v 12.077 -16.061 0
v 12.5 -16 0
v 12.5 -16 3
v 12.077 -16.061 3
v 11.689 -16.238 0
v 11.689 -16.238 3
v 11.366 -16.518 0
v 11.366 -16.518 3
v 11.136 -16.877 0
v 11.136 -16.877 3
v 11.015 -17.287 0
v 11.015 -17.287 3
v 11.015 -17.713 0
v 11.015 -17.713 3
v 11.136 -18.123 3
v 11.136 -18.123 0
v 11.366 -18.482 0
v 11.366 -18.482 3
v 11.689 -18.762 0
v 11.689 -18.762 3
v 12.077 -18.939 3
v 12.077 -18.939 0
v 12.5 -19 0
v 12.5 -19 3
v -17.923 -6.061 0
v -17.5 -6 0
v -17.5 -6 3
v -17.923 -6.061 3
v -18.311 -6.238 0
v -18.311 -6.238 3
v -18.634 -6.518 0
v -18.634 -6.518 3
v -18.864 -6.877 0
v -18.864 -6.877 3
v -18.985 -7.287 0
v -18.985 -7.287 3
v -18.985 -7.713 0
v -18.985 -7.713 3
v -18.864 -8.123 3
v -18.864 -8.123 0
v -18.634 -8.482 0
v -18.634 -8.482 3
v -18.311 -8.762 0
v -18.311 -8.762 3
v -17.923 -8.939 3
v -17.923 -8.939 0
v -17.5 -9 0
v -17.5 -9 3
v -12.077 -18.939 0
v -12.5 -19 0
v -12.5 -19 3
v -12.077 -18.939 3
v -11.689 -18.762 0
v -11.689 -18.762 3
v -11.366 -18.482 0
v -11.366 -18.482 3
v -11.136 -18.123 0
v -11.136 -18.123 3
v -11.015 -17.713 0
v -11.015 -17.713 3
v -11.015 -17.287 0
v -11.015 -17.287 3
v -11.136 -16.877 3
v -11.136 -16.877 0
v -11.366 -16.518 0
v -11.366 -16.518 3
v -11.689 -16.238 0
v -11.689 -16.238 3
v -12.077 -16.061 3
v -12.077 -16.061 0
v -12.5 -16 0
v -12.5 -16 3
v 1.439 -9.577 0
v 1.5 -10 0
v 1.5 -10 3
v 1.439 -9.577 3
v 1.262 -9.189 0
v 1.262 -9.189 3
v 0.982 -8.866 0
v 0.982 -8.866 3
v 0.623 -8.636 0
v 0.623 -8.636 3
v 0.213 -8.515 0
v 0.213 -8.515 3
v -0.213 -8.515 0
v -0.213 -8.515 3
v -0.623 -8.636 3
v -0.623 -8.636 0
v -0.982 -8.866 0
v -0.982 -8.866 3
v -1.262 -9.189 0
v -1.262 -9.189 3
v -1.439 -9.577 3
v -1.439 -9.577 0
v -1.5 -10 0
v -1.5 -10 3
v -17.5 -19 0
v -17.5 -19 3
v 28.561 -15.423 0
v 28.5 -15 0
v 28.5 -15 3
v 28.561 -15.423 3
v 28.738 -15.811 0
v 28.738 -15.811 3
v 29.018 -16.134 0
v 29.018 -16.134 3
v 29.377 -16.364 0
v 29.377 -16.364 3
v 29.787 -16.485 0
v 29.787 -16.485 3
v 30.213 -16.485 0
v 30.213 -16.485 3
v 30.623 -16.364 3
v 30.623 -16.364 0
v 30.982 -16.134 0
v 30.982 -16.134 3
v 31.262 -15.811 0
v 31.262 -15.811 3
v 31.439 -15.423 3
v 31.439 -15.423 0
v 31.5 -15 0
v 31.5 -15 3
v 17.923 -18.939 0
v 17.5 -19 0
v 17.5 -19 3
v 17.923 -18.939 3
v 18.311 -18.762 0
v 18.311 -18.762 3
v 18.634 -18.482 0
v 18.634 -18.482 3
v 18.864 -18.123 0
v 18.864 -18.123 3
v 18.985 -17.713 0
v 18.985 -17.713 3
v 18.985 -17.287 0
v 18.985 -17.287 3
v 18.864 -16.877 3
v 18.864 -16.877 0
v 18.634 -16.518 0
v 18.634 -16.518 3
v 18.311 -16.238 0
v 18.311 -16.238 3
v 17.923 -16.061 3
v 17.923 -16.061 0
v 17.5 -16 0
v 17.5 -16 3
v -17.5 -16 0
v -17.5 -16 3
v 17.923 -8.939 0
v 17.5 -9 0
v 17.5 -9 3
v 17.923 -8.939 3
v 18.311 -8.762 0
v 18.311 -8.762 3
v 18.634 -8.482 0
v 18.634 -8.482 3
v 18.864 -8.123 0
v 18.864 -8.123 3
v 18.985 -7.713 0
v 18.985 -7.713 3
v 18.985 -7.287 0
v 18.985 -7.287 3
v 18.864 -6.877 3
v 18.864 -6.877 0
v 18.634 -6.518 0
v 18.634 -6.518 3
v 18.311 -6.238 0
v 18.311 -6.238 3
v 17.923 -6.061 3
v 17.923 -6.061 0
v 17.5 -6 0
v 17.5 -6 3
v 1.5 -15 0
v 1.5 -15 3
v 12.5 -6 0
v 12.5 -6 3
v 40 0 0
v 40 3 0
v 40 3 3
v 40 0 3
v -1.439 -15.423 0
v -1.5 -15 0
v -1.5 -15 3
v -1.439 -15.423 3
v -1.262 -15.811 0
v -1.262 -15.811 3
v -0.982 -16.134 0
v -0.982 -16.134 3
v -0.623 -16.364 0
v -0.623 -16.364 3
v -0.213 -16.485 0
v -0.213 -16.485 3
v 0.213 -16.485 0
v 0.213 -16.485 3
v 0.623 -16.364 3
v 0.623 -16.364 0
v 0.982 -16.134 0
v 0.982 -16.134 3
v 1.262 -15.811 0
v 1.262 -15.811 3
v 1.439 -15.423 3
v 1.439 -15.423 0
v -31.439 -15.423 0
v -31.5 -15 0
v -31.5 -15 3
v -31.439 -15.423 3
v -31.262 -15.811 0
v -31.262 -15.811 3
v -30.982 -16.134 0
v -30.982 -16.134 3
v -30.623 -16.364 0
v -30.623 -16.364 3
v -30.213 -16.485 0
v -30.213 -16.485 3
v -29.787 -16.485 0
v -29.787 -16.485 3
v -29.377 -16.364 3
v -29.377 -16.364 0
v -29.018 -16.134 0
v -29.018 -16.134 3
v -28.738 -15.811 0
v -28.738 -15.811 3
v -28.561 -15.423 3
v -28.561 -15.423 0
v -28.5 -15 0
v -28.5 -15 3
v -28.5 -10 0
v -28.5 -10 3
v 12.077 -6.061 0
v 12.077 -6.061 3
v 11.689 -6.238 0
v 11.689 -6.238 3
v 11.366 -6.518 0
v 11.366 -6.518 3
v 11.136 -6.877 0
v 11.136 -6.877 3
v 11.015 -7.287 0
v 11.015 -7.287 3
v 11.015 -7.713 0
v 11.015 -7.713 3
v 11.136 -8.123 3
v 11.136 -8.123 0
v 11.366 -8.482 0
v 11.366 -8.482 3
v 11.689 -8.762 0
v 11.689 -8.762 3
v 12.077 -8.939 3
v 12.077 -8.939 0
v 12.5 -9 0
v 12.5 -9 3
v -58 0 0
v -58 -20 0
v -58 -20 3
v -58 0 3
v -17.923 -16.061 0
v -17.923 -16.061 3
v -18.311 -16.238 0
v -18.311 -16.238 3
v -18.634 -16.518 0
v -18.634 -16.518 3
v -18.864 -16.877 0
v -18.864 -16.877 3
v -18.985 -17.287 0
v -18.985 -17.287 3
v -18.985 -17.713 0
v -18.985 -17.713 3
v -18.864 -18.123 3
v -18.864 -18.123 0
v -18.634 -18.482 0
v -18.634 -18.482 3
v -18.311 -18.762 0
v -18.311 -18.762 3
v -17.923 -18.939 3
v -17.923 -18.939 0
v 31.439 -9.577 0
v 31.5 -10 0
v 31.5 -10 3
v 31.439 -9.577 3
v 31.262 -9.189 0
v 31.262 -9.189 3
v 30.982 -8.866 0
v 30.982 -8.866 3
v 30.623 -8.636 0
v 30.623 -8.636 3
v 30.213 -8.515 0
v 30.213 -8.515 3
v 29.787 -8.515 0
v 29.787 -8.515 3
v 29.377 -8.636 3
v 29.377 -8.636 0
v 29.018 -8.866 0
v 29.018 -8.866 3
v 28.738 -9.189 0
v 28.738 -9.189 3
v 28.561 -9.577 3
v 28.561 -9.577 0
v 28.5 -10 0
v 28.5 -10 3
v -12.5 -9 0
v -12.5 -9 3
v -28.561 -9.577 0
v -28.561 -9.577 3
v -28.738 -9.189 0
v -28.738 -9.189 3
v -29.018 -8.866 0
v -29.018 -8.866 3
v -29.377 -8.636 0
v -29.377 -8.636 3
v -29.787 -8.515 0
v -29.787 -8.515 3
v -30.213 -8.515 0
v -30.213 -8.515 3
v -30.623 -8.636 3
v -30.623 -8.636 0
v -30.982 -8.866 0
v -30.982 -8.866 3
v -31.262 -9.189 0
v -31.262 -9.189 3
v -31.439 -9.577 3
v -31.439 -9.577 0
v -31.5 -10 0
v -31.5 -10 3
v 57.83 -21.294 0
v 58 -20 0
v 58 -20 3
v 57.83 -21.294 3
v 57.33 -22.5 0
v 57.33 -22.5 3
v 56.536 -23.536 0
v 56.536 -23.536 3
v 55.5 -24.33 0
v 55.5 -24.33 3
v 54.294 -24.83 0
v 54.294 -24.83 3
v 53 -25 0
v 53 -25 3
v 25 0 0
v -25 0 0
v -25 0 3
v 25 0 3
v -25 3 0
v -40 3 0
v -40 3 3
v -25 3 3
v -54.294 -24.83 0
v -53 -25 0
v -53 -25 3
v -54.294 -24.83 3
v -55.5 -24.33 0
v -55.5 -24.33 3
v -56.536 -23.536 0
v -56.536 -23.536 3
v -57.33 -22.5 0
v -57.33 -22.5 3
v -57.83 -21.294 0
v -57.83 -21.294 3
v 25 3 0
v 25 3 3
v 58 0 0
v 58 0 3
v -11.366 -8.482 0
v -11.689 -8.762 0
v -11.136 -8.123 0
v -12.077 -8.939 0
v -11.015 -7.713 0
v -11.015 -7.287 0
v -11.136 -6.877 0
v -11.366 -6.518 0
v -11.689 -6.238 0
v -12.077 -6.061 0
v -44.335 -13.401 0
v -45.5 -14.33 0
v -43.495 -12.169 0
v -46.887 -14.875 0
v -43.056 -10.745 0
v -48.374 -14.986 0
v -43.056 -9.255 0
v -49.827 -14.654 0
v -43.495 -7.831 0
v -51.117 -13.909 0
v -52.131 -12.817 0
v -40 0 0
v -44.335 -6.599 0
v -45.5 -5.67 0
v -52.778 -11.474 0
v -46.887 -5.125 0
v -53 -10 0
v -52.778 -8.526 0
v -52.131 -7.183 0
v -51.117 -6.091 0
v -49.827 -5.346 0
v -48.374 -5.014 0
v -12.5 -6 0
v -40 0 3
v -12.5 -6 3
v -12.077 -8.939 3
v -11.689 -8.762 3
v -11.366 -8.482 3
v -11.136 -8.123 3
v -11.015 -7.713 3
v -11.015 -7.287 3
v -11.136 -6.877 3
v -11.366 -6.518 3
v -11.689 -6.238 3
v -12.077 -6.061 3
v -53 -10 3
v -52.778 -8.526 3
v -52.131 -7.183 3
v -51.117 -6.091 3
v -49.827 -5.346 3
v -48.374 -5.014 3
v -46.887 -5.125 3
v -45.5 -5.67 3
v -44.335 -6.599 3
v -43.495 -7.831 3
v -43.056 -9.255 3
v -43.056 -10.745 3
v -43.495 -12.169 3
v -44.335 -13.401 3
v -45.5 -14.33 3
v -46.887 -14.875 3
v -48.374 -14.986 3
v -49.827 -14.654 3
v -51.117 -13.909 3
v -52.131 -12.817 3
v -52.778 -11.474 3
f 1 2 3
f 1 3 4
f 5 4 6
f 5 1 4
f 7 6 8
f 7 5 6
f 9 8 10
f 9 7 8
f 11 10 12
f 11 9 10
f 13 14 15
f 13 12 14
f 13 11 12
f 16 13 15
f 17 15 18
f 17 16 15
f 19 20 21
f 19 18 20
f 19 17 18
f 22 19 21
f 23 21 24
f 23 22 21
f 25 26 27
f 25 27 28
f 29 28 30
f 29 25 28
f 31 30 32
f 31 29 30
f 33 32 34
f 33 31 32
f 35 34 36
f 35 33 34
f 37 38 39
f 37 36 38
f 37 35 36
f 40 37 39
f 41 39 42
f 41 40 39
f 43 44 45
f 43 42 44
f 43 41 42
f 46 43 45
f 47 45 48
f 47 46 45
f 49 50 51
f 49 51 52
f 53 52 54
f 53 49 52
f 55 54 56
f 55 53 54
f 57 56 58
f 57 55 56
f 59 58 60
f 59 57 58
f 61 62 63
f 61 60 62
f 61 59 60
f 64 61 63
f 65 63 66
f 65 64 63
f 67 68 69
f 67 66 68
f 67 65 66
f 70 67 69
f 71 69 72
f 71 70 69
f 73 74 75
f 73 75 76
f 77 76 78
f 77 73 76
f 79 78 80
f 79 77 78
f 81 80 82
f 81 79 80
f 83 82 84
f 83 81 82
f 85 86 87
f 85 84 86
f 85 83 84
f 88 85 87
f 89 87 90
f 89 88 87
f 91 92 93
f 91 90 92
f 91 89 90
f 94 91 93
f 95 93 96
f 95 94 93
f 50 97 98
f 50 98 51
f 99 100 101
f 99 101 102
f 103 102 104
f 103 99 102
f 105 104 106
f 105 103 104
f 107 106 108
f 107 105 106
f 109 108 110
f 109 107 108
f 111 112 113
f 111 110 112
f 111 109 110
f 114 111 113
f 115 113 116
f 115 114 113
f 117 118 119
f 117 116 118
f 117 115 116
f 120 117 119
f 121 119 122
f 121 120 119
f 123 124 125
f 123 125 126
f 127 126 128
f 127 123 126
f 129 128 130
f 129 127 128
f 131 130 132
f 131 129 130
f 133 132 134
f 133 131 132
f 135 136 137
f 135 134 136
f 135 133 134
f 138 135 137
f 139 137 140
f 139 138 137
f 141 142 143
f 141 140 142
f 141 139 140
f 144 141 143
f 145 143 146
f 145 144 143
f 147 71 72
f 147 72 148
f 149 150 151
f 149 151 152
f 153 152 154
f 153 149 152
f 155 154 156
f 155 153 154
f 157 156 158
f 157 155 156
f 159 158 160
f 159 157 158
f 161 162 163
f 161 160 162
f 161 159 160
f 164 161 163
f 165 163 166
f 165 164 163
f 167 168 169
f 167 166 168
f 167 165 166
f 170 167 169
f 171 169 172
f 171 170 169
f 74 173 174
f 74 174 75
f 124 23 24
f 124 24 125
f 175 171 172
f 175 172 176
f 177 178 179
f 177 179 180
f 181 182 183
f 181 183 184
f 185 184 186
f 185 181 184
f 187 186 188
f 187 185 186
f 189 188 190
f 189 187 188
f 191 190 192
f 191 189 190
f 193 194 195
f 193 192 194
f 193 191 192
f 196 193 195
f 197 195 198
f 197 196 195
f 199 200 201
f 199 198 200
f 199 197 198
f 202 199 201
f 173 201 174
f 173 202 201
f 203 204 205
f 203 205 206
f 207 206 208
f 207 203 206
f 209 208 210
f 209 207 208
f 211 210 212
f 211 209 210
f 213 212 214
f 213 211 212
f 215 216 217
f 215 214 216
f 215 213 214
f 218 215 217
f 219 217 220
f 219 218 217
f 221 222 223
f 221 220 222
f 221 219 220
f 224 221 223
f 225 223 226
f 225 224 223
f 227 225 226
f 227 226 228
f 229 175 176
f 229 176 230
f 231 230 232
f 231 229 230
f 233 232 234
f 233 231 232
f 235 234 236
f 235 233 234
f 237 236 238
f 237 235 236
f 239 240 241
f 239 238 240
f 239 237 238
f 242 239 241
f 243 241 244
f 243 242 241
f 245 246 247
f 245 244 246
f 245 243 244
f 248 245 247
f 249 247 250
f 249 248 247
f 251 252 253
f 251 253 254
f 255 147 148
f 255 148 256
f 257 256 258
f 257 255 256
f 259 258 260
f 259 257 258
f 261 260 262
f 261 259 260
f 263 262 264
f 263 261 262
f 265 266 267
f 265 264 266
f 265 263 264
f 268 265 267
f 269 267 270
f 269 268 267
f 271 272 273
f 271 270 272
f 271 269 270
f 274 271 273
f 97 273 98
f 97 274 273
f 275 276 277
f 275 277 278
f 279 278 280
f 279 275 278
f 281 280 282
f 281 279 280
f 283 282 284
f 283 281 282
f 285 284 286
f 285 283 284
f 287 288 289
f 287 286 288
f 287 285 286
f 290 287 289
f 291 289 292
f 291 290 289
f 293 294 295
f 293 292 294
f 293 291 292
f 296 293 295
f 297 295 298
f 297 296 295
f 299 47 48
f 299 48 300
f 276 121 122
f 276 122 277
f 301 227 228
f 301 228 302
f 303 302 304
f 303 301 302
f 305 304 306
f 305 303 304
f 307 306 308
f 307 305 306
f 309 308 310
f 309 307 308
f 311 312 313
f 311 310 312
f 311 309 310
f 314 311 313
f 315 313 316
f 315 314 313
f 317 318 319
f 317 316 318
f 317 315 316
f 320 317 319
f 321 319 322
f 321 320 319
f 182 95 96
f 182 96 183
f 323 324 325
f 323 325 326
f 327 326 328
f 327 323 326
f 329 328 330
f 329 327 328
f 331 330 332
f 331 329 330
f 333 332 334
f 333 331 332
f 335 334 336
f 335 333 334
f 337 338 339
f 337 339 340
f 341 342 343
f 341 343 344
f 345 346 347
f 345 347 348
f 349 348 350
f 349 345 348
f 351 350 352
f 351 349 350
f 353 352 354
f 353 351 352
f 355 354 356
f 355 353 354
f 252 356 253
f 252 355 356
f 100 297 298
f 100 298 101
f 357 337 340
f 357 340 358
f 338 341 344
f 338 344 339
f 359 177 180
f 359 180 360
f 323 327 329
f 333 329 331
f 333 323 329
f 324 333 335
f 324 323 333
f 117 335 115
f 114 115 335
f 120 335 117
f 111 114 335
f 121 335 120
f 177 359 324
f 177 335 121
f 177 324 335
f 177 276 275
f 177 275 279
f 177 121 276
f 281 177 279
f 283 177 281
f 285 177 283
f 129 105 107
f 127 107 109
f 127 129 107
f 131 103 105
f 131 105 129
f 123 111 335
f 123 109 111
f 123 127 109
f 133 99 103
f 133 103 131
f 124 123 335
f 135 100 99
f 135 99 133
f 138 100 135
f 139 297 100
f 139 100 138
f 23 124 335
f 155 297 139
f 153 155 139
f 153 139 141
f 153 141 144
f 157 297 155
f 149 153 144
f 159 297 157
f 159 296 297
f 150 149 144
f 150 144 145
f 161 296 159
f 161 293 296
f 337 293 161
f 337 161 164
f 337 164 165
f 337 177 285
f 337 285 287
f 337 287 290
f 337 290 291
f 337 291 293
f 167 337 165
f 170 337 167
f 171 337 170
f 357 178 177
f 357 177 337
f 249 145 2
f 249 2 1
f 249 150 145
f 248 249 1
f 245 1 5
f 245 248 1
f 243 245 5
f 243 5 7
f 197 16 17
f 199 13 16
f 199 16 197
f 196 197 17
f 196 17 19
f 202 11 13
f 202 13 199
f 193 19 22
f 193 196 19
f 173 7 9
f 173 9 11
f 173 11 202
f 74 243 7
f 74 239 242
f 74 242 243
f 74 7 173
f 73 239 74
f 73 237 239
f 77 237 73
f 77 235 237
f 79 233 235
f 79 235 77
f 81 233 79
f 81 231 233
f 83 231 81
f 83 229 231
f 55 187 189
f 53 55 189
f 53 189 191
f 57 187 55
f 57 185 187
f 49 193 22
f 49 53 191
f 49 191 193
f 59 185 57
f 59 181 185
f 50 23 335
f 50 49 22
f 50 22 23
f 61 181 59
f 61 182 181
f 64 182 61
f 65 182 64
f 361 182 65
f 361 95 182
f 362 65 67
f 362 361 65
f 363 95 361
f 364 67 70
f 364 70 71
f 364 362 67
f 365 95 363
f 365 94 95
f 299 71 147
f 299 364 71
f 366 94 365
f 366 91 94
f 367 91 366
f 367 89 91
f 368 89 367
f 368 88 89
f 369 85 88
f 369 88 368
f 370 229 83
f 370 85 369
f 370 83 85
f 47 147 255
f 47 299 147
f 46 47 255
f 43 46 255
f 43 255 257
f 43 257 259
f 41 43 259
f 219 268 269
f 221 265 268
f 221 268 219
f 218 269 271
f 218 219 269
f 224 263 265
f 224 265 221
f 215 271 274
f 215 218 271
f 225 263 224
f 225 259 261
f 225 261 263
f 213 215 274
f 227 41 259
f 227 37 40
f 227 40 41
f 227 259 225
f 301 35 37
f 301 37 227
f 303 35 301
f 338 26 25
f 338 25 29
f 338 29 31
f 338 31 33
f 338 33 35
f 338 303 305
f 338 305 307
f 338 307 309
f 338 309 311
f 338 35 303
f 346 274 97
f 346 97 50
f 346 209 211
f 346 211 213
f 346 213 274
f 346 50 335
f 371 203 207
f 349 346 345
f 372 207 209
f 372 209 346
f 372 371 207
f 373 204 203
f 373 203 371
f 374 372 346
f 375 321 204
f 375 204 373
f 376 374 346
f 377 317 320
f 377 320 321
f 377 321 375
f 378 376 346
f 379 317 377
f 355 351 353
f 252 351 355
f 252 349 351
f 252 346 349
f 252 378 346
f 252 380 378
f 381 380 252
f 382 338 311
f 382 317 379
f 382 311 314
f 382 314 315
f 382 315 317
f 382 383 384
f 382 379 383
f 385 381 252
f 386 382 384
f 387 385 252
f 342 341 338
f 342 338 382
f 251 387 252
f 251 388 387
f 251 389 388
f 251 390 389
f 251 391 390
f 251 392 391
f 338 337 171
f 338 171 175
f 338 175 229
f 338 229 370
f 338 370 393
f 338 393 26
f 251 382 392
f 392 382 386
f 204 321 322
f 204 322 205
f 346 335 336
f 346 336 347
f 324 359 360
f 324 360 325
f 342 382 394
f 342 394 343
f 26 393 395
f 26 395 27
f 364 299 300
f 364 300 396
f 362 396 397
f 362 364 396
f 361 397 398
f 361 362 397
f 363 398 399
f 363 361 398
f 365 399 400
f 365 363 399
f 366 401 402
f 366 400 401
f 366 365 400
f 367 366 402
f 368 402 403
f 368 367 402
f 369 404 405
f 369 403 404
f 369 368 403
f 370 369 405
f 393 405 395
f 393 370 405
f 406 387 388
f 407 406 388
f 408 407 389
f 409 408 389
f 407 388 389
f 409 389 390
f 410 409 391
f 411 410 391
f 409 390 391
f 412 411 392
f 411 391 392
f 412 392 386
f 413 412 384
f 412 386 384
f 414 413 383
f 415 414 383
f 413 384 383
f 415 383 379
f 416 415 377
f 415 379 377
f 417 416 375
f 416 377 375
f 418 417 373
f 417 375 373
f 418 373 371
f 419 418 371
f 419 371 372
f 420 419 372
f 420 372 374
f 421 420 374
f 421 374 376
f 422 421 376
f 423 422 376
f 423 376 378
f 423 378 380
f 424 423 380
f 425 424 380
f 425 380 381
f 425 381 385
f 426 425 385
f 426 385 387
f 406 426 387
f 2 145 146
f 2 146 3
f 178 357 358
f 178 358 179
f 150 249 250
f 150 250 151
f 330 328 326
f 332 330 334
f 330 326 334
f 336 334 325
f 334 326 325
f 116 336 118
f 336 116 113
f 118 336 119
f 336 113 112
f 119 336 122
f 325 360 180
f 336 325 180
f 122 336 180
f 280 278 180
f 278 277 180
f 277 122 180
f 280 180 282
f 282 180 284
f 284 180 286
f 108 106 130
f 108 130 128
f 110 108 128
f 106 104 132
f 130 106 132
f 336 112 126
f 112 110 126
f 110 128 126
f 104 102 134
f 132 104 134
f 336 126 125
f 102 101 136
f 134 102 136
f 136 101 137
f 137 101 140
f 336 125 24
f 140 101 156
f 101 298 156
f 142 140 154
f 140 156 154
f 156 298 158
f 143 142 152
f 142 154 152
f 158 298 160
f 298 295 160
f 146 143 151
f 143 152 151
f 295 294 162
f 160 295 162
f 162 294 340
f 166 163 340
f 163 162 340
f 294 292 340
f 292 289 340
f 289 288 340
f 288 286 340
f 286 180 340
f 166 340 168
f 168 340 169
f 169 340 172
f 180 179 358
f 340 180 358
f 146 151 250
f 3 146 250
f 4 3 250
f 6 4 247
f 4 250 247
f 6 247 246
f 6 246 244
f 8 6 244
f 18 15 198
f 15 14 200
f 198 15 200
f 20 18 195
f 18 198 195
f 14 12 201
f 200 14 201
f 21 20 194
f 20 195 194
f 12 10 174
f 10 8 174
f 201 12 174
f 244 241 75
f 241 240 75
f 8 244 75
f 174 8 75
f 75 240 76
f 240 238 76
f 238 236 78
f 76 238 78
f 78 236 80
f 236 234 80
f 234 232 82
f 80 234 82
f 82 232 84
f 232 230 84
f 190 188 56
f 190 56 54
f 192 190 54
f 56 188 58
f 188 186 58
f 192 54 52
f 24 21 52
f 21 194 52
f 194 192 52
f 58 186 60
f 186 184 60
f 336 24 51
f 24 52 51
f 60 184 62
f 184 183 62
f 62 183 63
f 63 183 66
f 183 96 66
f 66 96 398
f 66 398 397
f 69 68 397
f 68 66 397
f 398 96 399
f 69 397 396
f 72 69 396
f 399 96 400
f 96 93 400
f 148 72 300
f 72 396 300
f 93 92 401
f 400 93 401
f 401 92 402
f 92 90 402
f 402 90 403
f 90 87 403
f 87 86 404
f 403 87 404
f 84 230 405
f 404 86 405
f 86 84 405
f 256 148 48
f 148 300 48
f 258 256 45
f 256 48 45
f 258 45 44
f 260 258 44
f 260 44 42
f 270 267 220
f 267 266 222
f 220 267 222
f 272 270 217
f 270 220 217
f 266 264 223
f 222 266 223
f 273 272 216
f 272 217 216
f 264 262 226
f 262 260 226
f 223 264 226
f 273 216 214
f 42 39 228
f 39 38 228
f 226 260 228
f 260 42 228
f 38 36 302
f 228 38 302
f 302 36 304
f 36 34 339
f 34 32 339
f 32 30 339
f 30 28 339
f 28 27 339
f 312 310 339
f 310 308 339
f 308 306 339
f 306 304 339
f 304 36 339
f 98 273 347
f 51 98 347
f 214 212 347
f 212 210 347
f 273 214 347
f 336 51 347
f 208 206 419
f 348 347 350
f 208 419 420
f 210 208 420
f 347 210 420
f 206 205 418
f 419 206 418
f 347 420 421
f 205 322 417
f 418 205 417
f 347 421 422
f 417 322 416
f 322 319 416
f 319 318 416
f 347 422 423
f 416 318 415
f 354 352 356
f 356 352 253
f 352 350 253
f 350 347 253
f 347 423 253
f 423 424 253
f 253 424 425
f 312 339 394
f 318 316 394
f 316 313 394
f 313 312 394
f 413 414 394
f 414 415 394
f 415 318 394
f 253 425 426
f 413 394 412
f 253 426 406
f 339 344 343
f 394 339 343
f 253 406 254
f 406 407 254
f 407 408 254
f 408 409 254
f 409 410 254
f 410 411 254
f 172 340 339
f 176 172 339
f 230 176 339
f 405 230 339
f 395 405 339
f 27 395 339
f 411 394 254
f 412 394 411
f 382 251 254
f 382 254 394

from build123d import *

# Parameters (mm, degrees)
BOSS_EXTRUDE1_DEPTH = 3
SKETCH3_R           = 5
CUT_EXTRUDE2_DEPTH  = 64.229739838
CUT_EXTRUDE3_DEPTH  = 64.229739838


with BuildPart() as part:
    # Sketch1 → Boss-Extrude1 (new body)
    with BuildSketch(Plane.XY):
        with BuildLine():
            Line((-25, 0), (25, 0))
            Line((25, 0), (25, 3))
            Line((25, 3), (40, 3))
            Line((40, 3), (40, 0))
            Line((40, 0), (58, 0))
            Line((58, 0), (58, -20))
            ThreePointArc((58, -20), (56.535533906, -23.535533906), (53, -25))
            Line((53, -25), (-53, -25))
            ThreePointArc((-53, -25), (-56.535533906, -23.535533906), (-58, -20))
            Line((-58, -20), (-58, 0))
            Line((-58, 0), (-40, 0))
            Line((-40, 0), (-40, 3))
            Line((-40, 3), (-25, 3))
            Line((-25, 3), (-25, 0))
        make_face()
    extrude(amount=BOSS_EXTRUDE1_DEPTH)

    # Sketch3 → Cut-Extrude2 (cut, through all)
    with BuildSketch(Plane(origin=(0, 0, 0), x_dir=(-1, 0, 0), z_dir=(0, 0, -1))):
        with Locations((48, -10)):
            Circle(SKETCH3_R)
    extrude(amount=-CUT_EXTRUDE2_DEPTH, mode=Mode.SUBTRACT)

    # Sketch4 → Cut-Extrude3 (cut, through all)
    with BuildSketch(Plane(origin=(0, 0, 0), x_dir=(-1, 0, 0), z_dir=(0, 0, -1))):
        with BuildLine():
            Line((-28.5, -10), (-28.5, -15))
            ThreePointArc((-28.5, -15), (-30, -16.5), (-31.5, -15))
            Line((-31.5, -15), (-31.5, -10))
            ThreePointArc((-31.5, -10), (-30, -8.5), (-28.5, -10))
        make_face()
        with BuildLine():
            Line((-17.5, -6), (-12.5, -6))
            ThreePointArc((-12.5, -6), (-11, -7.5), (-12.5, -9))
            Line((-12.5, -9), (-17.5, -9))
            ThreePointArc((-17.5, -9), (-19, -7.5), (-17.5, -6))
        make_face()
        with BuildLine():
            Line((-1.5, -15), (-1.5, -10))
            ThreePointArc((-1.5, -10), (0, -8.5), (1.5, -10))
            Line((1.5, -10), (1.5, -15))
            ThreePointArc((1.5, -15), (0, -16.5), (-1.5, -15))
        make_face()
        with BuildLine():
            Line((28.5, -15), (28.5, -10))
            ThreePointArc((28.5, -10), (30, -8.5), (31.5, -10))
            Line((31.5, -10), (31.5, -15))
            ThreePointArc((31.5, -15), (30, -16.5), (28.5, -15))
        make_face()
        with BuildLine():
            Line((12.5, -6), (17.5, -6))
            ThreePointArc((17.5, -6), (19, -7.5), (17.5, -9))
            Line((17.5, -9), (12.5, -9))
            ThreePointArc((12.5, -9), (11, -7.5), (12.5, -6))
        make_face()
        with BuildLine():
            Line((12.5, -16), (17.5, -16))
            ThreePointArc((17.5, -16), (19, -17.5), (17.5, -19))
            Line((17.5, -19), (12.5, -19))
            ThreePointArc((12.5, -19), (11, -17.5), (12.5, -16))
        make_face()
        with BuildLine():
            Line((-17.5, -16), (-12.5, -16))
            ThreePointArc((-12.5, -16), (-11, -17.5), (-12.5, -19))
            Line((-12.5, -19), (-17.5, -19))
            ThreePointArc((-17.5, -19), (-19, -17.5), (-17.5, -16))
        make_face()
    extrude(amount=-CUT_EXTRUDE3_DEPTH, mode=Mode.SUBTRACT)


solid = part.part
